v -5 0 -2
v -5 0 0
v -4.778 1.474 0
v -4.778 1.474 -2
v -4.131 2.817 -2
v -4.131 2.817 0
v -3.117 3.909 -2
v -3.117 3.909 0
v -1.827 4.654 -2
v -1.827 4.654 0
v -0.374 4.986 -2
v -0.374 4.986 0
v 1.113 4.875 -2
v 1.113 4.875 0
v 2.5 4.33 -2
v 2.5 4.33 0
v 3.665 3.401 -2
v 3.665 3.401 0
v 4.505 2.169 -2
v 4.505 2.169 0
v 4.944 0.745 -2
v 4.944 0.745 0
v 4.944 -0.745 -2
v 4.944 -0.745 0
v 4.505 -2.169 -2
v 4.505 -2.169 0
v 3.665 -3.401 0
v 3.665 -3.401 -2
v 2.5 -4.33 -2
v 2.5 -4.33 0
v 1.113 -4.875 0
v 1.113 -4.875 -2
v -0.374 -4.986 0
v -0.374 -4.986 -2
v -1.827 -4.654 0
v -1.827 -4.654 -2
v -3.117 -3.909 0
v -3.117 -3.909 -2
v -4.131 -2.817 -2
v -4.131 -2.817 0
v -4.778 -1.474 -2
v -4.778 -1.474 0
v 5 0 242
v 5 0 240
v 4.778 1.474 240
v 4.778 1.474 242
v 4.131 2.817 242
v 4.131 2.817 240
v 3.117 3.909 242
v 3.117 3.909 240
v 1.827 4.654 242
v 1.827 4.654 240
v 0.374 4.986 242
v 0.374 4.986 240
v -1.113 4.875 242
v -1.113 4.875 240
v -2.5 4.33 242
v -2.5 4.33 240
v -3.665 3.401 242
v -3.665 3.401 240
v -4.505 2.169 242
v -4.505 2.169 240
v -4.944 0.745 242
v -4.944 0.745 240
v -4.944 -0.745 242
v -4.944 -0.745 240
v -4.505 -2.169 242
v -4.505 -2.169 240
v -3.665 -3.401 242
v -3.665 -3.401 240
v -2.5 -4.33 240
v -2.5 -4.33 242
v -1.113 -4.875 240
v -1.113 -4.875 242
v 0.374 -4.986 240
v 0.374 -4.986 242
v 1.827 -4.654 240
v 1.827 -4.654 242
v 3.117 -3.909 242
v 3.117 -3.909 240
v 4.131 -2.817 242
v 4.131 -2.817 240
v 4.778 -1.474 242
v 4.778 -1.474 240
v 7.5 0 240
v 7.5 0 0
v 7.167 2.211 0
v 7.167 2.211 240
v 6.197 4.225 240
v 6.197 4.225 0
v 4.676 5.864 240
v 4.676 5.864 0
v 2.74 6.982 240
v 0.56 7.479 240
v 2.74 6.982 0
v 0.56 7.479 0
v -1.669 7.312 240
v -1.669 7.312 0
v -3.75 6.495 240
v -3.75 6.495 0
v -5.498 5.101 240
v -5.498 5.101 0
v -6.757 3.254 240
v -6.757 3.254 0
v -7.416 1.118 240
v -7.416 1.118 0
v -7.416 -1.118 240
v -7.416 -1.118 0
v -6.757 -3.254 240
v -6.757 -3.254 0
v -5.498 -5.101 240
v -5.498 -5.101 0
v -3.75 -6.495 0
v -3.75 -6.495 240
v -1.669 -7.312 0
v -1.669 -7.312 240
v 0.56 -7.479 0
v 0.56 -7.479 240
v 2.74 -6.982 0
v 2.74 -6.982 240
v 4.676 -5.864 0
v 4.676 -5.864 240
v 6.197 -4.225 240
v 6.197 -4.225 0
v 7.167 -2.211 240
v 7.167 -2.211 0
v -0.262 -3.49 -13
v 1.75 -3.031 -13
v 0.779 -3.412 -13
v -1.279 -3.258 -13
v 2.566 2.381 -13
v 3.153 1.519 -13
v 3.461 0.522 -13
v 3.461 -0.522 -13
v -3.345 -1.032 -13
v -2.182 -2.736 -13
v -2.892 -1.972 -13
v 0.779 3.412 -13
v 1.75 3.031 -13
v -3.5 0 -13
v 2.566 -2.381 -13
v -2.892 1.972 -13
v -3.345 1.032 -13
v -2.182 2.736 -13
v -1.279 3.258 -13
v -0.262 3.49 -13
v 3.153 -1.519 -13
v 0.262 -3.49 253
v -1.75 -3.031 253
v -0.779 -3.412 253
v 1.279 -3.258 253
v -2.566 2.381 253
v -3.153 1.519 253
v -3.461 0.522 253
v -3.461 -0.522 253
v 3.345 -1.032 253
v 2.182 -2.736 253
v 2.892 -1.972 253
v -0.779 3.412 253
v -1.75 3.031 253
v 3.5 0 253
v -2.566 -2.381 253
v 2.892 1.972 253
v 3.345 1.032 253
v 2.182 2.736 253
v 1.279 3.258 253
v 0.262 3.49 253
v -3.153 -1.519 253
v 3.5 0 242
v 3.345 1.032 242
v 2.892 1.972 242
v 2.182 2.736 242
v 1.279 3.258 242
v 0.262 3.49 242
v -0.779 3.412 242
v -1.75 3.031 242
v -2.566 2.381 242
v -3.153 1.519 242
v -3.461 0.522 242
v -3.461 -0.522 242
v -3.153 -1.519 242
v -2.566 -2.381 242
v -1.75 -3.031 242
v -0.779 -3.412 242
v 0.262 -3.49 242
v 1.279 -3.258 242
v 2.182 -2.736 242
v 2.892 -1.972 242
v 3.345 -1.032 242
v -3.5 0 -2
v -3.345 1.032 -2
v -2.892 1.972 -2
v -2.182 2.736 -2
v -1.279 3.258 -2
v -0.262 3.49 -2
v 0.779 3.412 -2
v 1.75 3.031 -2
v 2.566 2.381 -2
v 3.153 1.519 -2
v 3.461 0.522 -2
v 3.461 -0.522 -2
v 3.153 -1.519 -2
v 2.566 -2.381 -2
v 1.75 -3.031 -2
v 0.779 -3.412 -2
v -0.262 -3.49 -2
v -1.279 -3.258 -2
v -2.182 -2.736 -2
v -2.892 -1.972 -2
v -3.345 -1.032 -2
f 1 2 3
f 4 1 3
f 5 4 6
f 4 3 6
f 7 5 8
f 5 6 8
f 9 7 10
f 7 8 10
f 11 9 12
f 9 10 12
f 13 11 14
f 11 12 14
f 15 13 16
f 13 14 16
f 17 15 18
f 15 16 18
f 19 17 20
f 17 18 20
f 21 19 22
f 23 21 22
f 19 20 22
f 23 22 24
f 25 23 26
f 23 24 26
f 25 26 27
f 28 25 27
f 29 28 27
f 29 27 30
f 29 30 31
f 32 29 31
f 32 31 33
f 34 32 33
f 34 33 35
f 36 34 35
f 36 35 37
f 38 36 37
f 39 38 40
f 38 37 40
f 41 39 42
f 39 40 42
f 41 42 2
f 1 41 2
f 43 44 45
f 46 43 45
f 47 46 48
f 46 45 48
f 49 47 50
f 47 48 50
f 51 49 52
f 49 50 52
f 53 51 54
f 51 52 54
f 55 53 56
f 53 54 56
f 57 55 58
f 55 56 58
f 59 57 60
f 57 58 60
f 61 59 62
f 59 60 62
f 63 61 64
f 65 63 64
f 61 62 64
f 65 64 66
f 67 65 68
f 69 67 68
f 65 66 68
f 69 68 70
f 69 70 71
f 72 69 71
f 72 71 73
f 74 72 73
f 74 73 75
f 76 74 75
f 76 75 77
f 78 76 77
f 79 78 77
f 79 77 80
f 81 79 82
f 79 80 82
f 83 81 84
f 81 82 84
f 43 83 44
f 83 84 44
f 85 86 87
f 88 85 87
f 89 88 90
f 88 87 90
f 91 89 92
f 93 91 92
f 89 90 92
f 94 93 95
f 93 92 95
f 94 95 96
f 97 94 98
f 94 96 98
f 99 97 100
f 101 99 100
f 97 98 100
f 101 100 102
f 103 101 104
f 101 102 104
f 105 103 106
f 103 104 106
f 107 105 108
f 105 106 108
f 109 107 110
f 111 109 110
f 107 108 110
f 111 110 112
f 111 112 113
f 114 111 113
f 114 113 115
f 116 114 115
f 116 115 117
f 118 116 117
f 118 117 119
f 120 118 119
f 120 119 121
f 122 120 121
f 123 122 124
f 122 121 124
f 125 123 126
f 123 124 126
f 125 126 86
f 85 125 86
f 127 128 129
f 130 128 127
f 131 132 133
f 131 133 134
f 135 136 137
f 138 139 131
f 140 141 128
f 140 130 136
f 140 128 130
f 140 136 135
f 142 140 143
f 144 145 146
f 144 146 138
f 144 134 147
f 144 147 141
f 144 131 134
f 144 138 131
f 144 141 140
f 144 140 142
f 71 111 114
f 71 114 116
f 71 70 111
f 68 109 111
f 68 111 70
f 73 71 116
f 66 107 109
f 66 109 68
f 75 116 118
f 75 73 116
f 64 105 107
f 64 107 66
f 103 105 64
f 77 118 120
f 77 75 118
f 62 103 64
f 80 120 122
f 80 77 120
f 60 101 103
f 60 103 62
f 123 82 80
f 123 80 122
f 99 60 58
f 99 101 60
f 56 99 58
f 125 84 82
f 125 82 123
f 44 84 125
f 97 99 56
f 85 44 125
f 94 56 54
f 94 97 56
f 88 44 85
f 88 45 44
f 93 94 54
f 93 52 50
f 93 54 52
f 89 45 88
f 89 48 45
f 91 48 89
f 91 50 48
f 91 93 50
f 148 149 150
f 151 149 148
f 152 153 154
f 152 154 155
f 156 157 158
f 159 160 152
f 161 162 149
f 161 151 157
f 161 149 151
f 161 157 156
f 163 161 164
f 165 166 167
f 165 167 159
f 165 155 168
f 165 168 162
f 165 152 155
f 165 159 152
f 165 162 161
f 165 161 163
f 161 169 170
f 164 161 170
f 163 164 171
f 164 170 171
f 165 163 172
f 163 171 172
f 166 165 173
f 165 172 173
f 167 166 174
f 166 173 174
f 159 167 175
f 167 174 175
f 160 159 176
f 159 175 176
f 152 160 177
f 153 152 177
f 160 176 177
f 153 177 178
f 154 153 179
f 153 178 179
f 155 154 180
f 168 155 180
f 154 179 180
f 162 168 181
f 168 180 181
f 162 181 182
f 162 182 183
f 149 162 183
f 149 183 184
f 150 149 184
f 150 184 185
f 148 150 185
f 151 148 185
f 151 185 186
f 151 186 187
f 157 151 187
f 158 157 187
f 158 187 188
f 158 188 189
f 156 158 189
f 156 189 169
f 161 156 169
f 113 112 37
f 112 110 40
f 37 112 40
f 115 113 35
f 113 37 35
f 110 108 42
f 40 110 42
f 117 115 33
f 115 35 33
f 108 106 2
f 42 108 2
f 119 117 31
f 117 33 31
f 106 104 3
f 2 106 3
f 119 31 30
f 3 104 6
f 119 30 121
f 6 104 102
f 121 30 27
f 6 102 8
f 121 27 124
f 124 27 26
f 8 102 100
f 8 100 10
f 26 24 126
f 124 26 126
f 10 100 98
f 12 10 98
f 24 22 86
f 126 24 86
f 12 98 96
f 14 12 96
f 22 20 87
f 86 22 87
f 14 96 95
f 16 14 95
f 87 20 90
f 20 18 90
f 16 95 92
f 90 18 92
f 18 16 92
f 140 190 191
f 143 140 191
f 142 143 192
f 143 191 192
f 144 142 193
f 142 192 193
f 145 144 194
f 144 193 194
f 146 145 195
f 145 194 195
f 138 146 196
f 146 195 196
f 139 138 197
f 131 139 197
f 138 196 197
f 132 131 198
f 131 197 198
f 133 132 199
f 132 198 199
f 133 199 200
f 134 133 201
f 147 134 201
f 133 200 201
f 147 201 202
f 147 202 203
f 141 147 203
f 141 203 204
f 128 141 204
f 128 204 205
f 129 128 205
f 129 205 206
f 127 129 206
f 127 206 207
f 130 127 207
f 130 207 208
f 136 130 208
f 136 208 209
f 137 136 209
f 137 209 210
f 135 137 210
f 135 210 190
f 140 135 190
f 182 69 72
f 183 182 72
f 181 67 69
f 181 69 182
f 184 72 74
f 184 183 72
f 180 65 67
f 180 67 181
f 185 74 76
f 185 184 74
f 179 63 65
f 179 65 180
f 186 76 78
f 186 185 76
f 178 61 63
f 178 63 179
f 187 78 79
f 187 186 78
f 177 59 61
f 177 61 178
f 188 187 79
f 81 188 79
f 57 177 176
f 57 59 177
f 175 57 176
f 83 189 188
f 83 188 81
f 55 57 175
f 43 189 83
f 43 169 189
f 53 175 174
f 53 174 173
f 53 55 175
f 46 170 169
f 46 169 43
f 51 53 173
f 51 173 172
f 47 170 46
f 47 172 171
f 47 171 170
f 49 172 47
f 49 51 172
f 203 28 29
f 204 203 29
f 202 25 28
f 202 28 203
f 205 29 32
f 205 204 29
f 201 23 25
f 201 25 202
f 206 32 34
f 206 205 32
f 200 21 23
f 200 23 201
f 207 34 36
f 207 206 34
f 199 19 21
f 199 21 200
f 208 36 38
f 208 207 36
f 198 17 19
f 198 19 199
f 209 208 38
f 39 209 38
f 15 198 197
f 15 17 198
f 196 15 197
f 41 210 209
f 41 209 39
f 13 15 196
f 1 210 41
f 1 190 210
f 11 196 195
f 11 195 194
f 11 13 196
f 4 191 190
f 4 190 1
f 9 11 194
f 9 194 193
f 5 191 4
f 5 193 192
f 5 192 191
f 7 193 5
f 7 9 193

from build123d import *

# Parameters (mm, degrees)
SKETCH_1_R      = 7.5
EXTRUDE_1_DEPTH = 240
SKETCH_2_R      = 3.5
EXTRUDE_2_DEPTH = 13
SKETCH_3_R      = 3.5
EXTRUDE_3_DEPTH = 13
SKETCH_4_R      = 5
EXTRUDE_4_DEPTH = 2
SKETCH_5_R      = 5
EXTRUDE_5_DEPTH = 2


with BuildPart() as part:
    # 草图1 → 凸台-拉伸1 (new body)
    with BuildSketch(Plane.XY):
        Circle(SKETCH_1_R)
    extrude(amount=EXTRUDE_1_DEPTH)

    # 草图2 → 凸台-拉伸2 (add)
    with BuildSketch(Plane(origin=(0, 0, 0), x_dir=(-1, 0, 0), z_dir=(0, 0, -1))):
        Circle(SKETCH_2_R)
    extrude(amount=EXTRUDE_2_DEPTH)

    # 草图3 → 凸台-拉伸3 (add)
    with BuildSketch(Plane.XY.offset(240)):
        Circle(SKETCH_3_R)
    extrude(amount=EXTRUDE_3_DEPTH)

    # 草图4 → 凸台-拉伸4 (add)
    with BuildSketch(Plane(origin=(0, 0, 0), x_dir=(-1, 0, 0), z_dir=(0, 0, -1))):
        Circle(SKETCH_4_R)
    extrude(amount=EXTRUDE_4_DEPTH)

    # 草图5 → 凸台-拉伸5 (add)
    with BuildSketch(Plane.XY.offset(240)):
        Circle(SKETCH_5_R)
    extrude(amount=EXTRUDE_5_DEPTH)


solid = part.part
